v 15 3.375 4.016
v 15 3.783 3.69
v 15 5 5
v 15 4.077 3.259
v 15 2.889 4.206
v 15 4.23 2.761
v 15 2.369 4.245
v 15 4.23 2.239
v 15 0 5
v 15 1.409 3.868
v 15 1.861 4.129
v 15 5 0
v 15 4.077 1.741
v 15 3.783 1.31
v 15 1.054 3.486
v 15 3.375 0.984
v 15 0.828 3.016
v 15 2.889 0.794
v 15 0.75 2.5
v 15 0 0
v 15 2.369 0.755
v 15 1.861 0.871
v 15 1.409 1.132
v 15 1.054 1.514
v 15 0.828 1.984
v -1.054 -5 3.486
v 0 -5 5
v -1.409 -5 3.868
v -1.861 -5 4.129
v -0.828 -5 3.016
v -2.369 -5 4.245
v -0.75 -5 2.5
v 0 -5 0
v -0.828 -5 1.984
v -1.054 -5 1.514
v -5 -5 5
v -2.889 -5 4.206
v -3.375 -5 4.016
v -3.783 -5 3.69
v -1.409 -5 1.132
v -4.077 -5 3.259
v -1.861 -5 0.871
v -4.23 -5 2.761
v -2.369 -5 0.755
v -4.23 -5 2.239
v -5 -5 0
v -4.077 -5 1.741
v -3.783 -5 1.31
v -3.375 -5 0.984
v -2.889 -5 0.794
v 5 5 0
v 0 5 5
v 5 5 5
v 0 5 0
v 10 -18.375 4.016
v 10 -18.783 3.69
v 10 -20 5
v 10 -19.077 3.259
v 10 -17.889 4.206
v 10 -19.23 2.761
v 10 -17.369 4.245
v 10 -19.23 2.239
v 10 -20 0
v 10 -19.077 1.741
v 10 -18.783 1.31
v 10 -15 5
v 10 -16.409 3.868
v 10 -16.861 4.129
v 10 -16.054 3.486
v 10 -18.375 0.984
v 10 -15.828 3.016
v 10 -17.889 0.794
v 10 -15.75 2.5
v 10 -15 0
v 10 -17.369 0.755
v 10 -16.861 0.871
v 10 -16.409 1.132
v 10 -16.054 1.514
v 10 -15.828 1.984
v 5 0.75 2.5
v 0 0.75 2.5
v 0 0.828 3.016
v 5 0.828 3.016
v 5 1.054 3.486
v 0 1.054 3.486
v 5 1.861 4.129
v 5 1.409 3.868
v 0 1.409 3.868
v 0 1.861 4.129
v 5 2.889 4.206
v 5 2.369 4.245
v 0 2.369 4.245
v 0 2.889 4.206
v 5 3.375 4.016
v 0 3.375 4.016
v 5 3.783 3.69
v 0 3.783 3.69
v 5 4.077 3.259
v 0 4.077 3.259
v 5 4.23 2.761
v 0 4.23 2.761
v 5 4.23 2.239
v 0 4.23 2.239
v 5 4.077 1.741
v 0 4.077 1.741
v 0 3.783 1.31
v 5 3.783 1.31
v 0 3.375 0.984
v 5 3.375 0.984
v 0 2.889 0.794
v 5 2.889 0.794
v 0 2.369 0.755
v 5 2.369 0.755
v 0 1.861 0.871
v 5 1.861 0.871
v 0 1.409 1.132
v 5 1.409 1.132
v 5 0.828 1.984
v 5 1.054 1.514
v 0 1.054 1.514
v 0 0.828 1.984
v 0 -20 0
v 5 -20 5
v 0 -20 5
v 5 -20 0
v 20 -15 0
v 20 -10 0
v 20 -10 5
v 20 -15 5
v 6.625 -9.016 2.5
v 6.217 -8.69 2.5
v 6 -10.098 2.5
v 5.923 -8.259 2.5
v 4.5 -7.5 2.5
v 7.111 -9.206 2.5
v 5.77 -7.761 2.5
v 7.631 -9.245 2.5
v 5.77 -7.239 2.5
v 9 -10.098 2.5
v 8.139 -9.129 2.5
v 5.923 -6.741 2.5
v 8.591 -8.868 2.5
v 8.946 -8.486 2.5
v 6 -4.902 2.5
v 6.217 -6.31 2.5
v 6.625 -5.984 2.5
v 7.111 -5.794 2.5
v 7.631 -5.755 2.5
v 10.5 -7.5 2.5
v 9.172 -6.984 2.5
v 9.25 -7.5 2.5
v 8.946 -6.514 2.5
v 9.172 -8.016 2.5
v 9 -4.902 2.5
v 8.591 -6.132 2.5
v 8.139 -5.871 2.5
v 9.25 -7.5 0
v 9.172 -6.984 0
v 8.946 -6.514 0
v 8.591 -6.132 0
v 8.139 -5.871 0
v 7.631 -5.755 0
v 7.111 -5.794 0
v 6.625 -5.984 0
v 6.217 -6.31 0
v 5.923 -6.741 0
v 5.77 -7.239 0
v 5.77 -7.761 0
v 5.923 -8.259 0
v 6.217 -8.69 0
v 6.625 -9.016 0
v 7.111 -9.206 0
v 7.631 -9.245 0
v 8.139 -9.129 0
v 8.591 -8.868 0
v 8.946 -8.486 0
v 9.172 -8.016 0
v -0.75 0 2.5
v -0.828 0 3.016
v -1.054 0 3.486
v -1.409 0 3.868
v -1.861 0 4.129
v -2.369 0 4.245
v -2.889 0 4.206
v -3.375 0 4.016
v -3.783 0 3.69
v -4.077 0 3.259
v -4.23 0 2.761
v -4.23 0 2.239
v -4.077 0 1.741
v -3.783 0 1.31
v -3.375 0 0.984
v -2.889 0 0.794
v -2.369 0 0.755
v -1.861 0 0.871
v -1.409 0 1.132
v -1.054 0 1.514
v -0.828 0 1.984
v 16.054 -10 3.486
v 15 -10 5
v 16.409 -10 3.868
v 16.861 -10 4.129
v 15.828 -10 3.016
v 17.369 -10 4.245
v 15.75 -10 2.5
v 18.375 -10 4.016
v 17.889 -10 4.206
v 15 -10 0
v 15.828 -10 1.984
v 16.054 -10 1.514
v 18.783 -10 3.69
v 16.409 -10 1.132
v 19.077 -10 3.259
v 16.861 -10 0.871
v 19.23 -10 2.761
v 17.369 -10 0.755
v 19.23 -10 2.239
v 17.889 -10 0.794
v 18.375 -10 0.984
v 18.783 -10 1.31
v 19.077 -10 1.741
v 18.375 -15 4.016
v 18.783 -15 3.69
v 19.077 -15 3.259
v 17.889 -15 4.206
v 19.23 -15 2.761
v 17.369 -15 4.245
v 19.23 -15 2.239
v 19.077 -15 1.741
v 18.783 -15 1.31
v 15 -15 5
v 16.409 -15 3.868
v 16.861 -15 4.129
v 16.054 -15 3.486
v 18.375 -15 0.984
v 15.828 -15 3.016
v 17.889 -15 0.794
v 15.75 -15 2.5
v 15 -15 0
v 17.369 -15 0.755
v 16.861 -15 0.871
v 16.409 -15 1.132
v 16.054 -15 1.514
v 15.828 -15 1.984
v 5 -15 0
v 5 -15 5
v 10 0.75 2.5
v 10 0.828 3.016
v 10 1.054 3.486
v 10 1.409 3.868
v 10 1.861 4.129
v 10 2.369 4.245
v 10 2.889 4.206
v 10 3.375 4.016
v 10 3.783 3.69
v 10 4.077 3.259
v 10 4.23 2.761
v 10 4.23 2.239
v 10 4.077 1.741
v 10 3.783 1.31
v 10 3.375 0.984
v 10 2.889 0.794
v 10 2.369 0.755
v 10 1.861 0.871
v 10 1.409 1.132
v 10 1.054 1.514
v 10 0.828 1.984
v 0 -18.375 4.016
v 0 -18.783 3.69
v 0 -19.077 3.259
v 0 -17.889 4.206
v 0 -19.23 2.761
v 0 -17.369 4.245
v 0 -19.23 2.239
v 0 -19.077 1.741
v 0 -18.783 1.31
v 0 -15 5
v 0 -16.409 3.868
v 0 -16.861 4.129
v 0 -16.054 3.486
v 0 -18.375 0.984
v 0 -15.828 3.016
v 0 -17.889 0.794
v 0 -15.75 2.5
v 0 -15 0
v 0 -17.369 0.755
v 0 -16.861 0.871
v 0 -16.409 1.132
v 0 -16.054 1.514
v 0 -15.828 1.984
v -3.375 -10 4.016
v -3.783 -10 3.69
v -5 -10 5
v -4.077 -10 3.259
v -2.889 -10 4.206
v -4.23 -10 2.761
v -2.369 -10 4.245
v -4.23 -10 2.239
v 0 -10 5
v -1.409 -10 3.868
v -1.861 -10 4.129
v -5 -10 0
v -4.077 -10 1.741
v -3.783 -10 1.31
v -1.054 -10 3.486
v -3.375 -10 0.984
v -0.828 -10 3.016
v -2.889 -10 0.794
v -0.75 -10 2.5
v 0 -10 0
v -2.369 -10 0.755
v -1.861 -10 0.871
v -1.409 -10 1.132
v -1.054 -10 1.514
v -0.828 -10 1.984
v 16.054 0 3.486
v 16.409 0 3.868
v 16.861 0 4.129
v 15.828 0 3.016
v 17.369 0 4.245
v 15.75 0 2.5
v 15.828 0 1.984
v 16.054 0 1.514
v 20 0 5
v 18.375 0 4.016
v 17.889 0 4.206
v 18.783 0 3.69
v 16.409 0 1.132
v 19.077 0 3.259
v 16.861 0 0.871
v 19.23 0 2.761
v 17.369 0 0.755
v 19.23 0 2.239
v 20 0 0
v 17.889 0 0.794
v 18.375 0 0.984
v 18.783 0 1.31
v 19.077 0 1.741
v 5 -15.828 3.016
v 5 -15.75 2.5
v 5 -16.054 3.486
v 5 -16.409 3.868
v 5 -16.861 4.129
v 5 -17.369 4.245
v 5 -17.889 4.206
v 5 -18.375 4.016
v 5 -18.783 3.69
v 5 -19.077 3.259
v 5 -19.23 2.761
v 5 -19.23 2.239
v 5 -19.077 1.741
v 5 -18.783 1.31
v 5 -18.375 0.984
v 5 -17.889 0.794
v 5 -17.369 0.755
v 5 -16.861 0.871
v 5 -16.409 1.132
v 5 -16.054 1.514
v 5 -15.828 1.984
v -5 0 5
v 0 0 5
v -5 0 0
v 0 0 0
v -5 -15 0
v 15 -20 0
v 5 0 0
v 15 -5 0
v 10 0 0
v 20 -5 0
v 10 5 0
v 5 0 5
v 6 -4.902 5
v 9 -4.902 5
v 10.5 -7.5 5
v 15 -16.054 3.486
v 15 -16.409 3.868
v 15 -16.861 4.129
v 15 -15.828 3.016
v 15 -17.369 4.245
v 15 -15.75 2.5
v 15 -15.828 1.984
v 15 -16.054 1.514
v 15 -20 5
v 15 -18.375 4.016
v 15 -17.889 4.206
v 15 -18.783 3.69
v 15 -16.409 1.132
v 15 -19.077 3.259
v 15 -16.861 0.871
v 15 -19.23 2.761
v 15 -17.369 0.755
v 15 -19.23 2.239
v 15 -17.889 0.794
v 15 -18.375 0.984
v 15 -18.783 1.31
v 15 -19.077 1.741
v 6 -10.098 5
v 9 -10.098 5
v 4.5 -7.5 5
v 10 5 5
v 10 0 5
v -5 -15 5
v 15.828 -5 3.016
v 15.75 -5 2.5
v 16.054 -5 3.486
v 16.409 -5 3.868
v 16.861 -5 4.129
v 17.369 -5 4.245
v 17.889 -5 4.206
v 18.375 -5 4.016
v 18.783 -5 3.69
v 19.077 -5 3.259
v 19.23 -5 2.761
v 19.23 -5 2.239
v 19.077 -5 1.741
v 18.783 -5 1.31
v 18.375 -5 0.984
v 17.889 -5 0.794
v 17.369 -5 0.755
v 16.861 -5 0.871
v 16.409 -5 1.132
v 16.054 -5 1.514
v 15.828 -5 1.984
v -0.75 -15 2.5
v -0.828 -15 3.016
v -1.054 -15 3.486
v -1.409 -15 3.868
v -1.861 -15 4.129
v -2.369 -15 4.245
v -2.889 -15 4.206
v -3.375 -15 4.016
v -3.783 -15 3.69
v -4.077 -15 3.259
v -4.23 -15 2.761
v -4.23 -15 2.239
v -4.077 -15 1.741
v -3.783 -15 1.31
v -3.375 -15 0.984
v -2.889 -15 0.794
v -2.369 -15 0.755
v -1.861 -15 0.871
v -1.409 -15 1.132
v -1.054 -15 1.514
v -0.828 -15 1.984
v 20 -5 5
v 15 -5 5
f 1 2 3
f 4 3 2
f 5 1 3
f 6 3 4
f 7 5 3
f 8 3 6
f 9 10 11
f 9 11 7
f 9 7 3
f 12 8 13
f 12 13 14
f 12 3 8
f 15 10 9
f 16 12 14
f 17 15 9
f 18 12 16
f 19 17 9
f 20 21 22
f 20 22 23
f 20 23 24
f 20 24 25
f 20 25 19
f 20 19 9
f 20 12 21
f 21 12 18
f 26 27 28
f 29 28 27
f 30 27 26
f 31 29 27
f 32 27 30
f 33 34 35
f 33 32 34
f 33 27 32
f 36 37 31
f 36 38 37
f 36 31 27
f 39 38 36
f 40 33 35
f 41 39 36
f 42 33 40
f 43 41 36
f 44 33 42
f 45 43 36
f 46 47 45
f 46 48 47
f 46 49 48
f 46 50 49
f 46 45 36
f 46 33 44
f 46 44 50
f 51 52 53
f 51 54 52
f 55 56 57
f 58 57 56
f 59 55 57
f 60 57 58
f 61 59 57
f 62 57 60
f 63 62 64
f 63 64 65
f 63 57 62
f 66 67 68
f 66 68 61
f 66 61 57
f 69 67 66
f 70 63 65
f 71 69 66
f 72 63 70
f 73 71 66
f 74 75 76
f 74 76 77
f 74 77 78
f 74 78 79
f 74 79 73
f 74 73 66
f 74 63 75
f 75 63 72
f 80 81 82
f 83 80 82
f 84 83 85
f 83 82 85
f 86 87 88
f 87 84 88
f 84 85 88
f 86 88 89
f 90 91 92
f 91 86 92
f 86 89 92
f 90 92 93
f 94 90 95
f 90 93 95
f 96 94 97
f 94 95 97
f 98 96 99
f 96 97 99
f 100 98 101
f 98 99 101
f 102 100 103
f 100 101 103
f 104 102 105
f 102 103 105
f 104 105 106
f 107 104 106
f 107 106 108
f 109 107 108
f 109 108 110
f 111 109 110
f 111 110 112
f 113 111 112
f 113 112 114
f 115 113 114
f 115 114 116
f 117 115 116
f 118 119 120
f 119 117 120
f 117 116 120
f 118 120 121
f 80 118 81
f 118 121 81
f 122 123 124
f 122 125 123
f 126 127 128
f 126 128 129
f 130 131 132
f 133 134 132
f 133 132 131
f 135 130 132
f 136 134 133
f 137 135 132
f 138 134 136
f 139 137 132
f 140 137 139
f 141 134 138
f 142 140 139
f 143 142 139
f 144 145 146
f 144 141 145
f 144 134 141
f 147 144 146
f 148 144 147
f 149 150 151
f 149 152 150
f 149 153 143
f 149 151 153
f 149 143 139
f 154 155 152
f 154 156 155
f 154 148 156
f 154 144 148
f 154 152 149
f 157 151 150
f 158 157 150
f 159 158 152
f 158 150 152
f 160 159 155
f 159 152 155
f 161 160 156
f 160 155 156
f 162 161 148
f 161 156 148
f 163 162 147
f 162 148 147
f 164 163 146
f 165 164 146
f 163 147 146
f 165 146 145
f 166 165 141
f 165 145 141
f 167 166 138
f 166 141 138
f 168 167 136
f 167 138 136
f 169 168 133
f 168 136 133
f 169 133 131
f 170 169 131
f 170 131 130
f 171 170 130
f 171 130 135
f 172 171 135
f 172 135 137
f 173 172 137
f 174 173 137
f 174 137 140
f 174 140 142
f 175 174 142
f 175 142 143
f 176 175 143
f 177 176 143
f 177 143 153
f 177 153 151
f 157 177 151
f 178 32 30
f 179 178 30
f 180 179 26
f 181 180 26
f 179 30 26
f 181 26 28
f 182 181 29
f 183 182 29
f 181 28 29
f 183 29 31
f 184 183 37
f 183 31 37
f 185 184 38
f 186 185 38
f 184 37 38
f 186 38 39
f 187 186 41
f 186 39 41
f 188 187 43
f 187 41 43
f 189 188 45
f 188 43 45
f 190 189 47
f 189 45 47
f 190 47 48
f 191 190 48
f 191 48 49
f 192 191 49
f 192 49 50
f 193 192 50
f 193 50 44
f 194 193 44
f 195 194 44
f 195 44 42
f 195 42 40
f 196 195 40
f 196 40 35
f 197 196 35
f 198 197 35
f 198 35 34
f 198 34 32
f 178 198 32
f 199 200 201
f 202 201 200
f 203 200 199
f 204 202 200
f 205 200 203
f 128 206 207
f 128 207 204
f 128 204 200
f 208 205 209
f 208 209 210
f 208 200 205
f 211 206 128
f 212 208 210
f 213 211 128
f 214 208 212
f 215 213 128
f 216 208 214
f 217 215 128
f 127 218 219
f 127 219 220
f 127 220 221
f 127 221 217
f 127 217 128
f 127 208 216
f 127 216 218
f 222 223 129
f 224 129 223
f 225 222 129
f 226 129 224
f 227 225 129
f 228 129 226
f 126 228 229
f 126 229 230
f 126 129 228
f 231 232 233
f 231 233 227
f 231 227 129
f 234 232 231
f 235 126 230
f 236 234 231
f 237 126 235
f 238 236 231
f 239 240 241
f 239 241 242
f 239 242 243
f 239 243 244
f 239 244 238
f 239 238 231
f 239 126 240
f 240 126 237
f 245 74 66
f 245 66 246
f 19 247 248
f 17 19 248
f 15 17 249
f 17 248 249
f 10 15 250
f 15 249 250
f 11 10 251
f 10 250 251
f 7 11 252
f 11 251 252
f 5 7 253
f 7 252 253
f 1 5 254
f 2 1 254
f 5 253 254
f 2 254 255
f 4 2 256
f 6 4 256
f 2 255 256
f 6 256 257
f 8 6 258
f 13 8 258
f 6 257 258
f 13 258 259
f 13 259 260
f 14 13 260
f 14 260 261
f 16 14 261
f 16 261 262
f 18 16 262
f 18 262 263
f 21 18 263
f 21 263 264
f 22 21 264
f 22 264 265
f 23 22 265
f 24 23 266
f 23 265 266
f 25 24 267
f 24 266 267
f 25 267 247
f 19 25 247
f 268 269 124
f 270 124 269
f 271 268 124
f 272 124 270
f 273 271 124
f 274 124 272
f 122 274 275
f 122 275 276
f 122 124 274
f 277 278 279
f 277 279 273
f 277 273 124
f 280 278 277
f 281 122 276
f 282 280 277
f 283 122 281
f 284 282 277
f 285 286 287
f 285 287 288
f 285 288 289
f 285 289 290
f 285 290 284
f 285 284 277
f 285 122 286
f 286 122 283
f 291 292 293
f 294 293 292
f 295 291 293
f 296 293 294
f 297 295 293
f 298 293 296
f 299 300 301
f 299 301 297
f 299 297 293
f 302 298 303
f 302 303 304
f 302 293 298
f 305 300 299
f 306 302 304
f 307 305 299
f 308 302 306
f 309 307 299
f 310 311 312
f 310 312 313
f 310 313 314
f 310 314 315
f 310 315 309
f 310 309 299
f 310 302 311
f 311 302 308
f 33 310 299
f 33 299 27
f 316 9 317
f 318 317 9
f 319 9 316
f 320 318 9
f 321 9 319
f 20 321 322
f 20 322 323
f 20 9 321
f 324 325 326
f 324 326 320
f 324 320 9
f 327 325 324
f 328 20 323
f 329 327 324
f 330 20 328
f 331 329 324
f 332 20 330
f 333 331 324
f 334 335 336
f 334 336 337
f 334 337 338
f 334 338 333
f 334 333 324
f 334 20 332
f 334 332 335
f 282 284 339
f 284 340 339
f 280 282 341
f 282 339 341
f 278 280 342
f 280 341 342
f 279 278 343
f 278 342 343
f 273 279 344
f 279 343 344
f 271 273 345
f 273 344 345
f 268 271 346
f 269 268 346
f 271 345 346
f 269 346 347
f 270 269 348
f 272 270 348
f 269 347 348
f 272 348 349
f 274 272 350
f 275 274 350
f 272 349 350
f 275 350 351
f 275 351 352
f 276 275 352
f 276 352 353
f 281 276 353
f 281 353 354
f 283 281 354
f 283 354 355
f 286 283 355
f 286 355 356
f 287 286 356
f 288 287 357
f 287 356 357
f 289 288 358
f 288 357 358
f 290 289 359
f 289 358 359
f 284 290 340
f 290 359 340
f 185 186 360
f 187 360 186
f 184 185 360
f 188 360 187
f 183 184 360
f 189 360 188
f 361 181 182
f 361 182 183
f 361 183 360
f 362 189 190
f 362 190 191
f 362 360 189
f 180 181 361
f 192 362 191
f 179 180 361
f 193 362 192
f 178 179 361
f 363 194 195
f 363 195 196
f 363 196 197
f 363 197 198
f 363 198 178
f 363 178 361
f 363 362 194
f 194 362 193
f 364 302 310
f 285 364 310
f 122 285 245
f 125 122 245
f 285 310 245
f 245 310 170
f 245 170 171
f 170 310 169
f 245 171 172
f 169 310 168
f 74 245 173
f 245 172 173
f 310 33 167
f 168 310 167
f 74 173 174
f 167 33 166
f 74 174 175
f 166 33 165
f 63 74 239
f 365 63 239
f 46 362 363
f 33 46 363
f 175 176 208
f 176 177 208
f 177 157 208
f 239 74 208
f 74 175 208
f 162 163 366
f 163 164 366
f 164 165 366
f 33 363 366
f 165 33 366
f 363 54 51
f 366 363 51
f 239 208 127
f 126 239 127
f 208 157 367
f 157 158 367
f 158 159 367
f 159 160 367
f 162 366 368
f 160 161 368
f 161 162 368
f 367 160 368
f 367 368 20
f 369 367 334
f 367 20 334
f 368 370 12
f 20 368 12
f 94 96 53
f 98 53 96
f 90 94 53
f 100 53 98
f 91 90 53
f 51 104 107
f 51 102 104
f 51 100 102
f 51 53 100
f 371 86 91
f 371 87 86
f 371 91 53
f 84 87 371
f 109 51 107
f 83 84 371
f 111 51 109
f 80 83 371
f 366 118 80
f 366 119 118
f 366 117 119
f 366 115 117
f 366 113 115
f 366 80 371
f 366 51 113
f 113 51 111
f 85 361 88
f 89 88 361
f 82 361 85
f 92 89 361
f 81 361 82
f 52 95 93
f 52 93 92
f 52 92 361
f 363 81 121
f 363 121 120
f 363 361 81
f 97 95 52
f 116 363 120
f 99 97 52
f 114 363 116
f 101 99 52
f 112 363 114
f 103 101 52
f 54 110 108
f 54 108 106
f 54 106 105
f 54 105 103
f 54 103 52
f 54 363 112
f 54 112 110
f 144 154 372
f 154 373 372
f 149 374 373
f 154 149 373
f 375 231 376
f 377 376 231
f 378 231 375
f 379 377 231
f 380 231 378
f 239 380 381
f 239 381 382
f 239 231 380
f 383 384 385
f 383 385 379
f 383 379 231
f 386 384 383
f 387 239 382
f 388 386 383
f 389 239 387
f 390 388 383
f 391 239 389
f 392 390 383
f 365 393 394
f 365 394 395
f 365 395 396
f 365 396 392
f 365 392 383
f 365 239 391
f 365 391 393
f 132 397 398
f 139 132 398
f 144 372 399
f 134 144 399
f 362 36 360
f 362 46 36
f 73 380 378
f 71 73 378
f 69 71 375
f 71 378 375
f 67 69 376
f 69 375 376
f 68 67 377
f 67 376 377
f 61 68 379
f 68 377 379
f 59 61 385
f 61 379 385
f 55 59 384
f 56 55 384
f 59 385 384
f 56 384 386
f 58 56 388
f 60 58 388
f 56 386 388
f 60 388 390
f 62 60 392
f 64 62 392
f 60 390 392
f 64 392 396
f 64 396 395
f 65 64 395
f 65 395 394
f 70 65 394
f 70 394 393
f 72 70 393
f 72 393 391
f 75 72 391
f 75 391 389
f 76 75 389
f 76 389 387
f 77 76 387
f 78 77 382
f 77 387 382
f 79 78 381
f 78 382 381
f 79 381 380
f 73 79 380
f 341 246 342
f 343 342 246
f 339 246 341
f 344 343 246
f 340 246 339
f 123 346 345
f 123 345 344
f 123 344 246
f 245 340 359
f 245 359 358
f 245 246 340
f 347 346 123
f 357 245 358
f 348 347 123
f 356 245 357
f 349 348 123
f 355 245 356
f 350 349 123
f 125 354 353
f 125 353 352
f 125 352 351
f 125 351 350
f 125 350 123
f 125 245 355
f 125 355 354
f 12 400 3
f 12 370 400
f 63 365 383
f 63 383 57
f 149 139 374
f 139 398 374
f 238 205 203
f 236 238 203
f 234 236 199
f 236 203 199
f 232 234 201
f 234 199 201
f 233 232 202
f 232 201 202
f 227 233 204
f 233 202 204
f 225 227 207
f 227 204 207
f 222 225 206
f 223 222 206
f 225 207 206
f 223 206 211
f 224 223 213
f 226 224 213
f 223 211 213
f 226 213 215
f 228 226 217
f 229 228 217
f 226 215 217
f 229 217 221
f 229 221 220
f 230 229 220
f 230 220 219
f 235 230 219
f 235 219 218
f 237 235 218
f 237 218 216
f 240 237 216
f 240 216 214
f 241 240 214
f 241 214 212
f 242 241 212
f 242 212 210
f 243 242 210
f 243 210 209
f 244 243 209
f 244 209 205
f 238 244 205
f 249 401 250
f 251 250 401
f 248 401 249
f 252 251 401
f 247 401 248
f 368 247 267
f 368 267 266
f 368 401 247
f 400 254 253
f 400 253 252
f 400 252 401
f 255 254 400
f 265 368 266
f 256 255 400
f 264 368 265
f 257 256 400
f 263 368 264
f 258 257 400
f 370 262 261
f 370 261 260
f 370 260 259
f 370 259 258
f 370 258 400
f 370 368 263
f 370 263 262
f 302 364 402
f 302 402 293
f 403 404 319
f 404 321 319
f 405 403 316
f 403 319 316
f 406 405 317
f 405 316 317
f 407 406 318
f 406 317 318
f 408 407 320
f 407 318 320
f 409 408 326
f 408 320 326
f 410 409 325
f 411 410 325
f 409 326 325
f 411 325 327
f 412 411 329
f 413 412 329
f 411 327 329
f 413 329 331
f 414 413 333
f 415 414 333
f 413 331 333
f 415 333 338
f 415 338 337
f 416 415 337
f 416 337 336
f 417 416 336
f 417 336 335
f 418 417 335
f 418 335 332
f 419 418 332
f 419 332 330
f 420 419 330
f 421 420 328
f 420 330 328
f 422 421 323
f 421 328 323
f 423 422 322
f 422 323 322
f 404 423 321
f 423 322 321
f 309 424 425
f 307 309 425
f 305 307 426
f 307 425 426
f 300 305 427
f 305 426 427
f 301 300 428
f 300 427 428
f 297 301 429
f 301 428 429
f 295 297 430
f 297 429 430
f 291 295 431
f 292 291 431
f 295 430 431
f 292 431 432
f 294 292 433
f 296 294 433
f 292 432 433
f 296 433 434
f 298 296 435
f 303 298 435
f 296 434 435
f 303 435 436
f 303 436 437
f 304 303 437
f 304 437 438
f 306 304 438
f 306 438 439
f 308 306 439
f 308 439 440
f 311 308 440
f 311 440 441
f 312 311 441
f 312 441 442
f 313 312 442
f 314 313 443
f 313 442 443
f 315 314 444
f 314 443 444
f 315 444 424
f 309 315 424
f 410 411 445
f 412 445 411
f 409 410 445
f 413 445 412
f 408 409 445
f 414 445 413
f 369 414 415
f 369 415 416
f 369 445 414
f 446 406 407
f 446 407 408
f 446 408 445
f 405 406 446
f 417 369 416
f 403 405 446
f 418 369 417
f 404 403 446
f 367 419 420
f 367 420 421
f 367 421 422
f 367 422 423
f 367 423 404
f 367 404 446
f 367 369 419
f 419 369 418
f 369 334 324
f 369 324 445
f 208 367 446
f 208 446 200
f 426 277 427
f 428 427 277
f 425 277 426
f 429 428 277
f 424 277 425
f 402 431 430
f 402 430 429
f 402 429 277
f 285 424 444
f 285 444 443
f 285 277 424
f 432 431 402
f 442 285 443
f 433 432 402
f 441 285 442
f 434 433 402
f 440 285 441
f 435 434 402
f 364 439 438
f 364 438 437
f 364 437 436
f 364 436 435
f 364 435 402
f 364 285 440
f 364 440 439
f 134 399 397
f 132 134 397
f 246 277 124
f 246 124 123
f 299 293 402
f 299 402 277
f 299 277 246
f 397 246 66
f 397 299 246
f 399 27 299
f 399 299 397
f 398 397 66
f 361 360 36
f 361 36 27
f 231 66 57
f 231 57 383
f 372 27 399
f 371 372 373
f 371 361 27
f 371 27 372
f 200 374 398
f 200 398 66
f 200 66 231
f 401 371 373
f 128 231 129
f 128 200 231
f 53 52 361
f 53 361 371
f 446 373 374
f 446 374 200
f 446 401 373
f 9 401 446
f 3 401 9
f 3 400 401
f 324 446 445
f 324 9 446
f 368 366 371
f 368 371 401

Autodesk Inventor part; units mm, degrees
ref_plane "YZ Plane" through (0, 0, 0) normal (1, 0, 0) x (0, 1, 0)
ref_plane "XZ Plane" through (0, 0, 0) normal (0, 1, 0) x (-1, 0, 0)
ref_plane "XY Plane" through (0, 0, 0) normal (0, 0, 1) x (1, 0, 0)
sketch "Sketch1" plane through (0, 0, 0) normal (0, 0, 1) x (1, 0, 0)
  line L0 (0, 0) -> (0, 5)
  line L1 (0, 5) -> (5, 5)
  line L2 (5, 5) -> (5, 0)
  line L3 (5, 0) -> (10, 0)
  line L4 (10, 0) -> (10, 5)
  line L5 (10, 5) -> (15, 5)
  line L6 (15, 5) -> (15, 0)
  line L7 (15, 0) -> (20, 0)
  line L8 (20, 0) -> (20, -5)
  line L9 (20, -5) -> (15, -5)
  line L10 (15, -5) -> (15, -10)
  line L11 (15, -10) -> (20, -10)
  line L12 (20, -10) -> (20, -15)
  line L13 (20, -15) -> (15, -15)
  line L14 (15, -15) -> (15, -20)
  line L15 (15, -20) -> (10, -20)
  line L16 (10, -20) -> (10, -15)
  line L17 (10, -15) -> (5, -15)
  line L18 (5, -15) -> (5, -20)
  line L19 (5, -20) -> (0, -20)
  line L20 (0, -20) -> (0, -15)
  line L21 (0, -15) -> (-5, -15)
  line L22 (-5, -15) -> (-5, -10)
  line L23 (-5, -10) -> (0, -10)
  line L24 (0, -10) -> (0, -5)
  line L25 (0, -5) -> (-5, -5)
  line L26 (-5, -5) -> (-5, 0)
  line L27 (-5, 0) -> (0, 0)
  dimension "d0" = 5
  dimension "d1" = 5
  dimension "d2" = 5
  dimension "d3" = 5
  dimension "d4" = 5
  dimension "d5" = 5
  dimension "d6" = 5
  dimension "d7" = 5
  dimension "d8" = 5
  dimension "d9" = 5
  dimension "d10" = 5
  dimension "d11" = 5
  dimension "d12" = 5
  dimension "d13" = 5
  dimension "d14" = 5
  dimension "d15" = 5
  dimension "d16" = 5
  dimension "d17" = 5
  dimension "d18" = 5
  dimension "d19" = 5
  dimension "d20" = 5
  dimension "d21" = 5
  dimension "d22" = 5
  dimension "d23" = 5
  dimension "d24" = 5
  dimension "d25" = 90
  dimension "d26" = 5
  dimension "d27" = 5
extrude "Extrusion1" add sketch "Sketch1" along normal blind 5
sketch "Sketch2" plane through (0, 0, 5) normal (0, 0, 1) x (1, 0, 0)
  line L0 (15, -10) -> (15, -5) projected
  line L1 (15, -7.5) -> (0, -7.5)
  line L2 (0, -10) -> (0, -5) projected
  circle A0 centre (7.5, -7.5) radius 1.75
  point P0 (0, 0)
  dimension "d30" = 3.5
extrude "Extrusion2" cut sketch "Sketch2" against normal blind 5
sketch "Sketch3" plane through (0, 0, 5) normal (0, 0, 1) x (1, 0, 0)
  circle A0 centre (7.5, -7.5) radius 1.75 projected
  line L0 (7.5, -7.5) -> (10.5, -7.5)
  line L1 (10.5, -7.5) -> (9, -4.9019)
  line L2 (7.5, -7.5) -> (9, -4.9019)
  point P0 (0, 0)
  dimension "d33" = 3
  dimension "d34" = 3
  dimension "d35" = 60
extrude "Extrusion3" cut sketch "Sketch3" against normal blind 2.5 contours L0 L2 A0 | A0 L2 L1 L0 picked at (8.3623, -6.7236)
pattern_circular "Circular Pattern1" count 6 over 360 about axis through (7.5, -7.5, 5) along (0, 0, -1) of "Extrusion3"
sketch "Sketch4" plane through (-5, -15, 0) normal (0, -1, 0) x (1, 0, 0)
  line L0 (0, 5) -> (2.5, 5)
  line L1 (0, 5) -> (5, 5) projected
  line L2 (2.5, 5) -> (2.5, 2.5)
  circle A0 centre (2.5, 2.5) radius 1.75
  point P0 (5, 0)
  dimension "d41" = 2.5
  dimension "d42" = 2.5
  dimension "d43" = 3.5
extrude "Extrusion4" cut sketch "Sketch4" against normal through all
pattern_circular "Circular Pattern2" count 4 over 360 about axis through (7.5, -7.5, 5) along (0, 0, -1) of "Extrusion4"
properties part number "crossCenterMini"
